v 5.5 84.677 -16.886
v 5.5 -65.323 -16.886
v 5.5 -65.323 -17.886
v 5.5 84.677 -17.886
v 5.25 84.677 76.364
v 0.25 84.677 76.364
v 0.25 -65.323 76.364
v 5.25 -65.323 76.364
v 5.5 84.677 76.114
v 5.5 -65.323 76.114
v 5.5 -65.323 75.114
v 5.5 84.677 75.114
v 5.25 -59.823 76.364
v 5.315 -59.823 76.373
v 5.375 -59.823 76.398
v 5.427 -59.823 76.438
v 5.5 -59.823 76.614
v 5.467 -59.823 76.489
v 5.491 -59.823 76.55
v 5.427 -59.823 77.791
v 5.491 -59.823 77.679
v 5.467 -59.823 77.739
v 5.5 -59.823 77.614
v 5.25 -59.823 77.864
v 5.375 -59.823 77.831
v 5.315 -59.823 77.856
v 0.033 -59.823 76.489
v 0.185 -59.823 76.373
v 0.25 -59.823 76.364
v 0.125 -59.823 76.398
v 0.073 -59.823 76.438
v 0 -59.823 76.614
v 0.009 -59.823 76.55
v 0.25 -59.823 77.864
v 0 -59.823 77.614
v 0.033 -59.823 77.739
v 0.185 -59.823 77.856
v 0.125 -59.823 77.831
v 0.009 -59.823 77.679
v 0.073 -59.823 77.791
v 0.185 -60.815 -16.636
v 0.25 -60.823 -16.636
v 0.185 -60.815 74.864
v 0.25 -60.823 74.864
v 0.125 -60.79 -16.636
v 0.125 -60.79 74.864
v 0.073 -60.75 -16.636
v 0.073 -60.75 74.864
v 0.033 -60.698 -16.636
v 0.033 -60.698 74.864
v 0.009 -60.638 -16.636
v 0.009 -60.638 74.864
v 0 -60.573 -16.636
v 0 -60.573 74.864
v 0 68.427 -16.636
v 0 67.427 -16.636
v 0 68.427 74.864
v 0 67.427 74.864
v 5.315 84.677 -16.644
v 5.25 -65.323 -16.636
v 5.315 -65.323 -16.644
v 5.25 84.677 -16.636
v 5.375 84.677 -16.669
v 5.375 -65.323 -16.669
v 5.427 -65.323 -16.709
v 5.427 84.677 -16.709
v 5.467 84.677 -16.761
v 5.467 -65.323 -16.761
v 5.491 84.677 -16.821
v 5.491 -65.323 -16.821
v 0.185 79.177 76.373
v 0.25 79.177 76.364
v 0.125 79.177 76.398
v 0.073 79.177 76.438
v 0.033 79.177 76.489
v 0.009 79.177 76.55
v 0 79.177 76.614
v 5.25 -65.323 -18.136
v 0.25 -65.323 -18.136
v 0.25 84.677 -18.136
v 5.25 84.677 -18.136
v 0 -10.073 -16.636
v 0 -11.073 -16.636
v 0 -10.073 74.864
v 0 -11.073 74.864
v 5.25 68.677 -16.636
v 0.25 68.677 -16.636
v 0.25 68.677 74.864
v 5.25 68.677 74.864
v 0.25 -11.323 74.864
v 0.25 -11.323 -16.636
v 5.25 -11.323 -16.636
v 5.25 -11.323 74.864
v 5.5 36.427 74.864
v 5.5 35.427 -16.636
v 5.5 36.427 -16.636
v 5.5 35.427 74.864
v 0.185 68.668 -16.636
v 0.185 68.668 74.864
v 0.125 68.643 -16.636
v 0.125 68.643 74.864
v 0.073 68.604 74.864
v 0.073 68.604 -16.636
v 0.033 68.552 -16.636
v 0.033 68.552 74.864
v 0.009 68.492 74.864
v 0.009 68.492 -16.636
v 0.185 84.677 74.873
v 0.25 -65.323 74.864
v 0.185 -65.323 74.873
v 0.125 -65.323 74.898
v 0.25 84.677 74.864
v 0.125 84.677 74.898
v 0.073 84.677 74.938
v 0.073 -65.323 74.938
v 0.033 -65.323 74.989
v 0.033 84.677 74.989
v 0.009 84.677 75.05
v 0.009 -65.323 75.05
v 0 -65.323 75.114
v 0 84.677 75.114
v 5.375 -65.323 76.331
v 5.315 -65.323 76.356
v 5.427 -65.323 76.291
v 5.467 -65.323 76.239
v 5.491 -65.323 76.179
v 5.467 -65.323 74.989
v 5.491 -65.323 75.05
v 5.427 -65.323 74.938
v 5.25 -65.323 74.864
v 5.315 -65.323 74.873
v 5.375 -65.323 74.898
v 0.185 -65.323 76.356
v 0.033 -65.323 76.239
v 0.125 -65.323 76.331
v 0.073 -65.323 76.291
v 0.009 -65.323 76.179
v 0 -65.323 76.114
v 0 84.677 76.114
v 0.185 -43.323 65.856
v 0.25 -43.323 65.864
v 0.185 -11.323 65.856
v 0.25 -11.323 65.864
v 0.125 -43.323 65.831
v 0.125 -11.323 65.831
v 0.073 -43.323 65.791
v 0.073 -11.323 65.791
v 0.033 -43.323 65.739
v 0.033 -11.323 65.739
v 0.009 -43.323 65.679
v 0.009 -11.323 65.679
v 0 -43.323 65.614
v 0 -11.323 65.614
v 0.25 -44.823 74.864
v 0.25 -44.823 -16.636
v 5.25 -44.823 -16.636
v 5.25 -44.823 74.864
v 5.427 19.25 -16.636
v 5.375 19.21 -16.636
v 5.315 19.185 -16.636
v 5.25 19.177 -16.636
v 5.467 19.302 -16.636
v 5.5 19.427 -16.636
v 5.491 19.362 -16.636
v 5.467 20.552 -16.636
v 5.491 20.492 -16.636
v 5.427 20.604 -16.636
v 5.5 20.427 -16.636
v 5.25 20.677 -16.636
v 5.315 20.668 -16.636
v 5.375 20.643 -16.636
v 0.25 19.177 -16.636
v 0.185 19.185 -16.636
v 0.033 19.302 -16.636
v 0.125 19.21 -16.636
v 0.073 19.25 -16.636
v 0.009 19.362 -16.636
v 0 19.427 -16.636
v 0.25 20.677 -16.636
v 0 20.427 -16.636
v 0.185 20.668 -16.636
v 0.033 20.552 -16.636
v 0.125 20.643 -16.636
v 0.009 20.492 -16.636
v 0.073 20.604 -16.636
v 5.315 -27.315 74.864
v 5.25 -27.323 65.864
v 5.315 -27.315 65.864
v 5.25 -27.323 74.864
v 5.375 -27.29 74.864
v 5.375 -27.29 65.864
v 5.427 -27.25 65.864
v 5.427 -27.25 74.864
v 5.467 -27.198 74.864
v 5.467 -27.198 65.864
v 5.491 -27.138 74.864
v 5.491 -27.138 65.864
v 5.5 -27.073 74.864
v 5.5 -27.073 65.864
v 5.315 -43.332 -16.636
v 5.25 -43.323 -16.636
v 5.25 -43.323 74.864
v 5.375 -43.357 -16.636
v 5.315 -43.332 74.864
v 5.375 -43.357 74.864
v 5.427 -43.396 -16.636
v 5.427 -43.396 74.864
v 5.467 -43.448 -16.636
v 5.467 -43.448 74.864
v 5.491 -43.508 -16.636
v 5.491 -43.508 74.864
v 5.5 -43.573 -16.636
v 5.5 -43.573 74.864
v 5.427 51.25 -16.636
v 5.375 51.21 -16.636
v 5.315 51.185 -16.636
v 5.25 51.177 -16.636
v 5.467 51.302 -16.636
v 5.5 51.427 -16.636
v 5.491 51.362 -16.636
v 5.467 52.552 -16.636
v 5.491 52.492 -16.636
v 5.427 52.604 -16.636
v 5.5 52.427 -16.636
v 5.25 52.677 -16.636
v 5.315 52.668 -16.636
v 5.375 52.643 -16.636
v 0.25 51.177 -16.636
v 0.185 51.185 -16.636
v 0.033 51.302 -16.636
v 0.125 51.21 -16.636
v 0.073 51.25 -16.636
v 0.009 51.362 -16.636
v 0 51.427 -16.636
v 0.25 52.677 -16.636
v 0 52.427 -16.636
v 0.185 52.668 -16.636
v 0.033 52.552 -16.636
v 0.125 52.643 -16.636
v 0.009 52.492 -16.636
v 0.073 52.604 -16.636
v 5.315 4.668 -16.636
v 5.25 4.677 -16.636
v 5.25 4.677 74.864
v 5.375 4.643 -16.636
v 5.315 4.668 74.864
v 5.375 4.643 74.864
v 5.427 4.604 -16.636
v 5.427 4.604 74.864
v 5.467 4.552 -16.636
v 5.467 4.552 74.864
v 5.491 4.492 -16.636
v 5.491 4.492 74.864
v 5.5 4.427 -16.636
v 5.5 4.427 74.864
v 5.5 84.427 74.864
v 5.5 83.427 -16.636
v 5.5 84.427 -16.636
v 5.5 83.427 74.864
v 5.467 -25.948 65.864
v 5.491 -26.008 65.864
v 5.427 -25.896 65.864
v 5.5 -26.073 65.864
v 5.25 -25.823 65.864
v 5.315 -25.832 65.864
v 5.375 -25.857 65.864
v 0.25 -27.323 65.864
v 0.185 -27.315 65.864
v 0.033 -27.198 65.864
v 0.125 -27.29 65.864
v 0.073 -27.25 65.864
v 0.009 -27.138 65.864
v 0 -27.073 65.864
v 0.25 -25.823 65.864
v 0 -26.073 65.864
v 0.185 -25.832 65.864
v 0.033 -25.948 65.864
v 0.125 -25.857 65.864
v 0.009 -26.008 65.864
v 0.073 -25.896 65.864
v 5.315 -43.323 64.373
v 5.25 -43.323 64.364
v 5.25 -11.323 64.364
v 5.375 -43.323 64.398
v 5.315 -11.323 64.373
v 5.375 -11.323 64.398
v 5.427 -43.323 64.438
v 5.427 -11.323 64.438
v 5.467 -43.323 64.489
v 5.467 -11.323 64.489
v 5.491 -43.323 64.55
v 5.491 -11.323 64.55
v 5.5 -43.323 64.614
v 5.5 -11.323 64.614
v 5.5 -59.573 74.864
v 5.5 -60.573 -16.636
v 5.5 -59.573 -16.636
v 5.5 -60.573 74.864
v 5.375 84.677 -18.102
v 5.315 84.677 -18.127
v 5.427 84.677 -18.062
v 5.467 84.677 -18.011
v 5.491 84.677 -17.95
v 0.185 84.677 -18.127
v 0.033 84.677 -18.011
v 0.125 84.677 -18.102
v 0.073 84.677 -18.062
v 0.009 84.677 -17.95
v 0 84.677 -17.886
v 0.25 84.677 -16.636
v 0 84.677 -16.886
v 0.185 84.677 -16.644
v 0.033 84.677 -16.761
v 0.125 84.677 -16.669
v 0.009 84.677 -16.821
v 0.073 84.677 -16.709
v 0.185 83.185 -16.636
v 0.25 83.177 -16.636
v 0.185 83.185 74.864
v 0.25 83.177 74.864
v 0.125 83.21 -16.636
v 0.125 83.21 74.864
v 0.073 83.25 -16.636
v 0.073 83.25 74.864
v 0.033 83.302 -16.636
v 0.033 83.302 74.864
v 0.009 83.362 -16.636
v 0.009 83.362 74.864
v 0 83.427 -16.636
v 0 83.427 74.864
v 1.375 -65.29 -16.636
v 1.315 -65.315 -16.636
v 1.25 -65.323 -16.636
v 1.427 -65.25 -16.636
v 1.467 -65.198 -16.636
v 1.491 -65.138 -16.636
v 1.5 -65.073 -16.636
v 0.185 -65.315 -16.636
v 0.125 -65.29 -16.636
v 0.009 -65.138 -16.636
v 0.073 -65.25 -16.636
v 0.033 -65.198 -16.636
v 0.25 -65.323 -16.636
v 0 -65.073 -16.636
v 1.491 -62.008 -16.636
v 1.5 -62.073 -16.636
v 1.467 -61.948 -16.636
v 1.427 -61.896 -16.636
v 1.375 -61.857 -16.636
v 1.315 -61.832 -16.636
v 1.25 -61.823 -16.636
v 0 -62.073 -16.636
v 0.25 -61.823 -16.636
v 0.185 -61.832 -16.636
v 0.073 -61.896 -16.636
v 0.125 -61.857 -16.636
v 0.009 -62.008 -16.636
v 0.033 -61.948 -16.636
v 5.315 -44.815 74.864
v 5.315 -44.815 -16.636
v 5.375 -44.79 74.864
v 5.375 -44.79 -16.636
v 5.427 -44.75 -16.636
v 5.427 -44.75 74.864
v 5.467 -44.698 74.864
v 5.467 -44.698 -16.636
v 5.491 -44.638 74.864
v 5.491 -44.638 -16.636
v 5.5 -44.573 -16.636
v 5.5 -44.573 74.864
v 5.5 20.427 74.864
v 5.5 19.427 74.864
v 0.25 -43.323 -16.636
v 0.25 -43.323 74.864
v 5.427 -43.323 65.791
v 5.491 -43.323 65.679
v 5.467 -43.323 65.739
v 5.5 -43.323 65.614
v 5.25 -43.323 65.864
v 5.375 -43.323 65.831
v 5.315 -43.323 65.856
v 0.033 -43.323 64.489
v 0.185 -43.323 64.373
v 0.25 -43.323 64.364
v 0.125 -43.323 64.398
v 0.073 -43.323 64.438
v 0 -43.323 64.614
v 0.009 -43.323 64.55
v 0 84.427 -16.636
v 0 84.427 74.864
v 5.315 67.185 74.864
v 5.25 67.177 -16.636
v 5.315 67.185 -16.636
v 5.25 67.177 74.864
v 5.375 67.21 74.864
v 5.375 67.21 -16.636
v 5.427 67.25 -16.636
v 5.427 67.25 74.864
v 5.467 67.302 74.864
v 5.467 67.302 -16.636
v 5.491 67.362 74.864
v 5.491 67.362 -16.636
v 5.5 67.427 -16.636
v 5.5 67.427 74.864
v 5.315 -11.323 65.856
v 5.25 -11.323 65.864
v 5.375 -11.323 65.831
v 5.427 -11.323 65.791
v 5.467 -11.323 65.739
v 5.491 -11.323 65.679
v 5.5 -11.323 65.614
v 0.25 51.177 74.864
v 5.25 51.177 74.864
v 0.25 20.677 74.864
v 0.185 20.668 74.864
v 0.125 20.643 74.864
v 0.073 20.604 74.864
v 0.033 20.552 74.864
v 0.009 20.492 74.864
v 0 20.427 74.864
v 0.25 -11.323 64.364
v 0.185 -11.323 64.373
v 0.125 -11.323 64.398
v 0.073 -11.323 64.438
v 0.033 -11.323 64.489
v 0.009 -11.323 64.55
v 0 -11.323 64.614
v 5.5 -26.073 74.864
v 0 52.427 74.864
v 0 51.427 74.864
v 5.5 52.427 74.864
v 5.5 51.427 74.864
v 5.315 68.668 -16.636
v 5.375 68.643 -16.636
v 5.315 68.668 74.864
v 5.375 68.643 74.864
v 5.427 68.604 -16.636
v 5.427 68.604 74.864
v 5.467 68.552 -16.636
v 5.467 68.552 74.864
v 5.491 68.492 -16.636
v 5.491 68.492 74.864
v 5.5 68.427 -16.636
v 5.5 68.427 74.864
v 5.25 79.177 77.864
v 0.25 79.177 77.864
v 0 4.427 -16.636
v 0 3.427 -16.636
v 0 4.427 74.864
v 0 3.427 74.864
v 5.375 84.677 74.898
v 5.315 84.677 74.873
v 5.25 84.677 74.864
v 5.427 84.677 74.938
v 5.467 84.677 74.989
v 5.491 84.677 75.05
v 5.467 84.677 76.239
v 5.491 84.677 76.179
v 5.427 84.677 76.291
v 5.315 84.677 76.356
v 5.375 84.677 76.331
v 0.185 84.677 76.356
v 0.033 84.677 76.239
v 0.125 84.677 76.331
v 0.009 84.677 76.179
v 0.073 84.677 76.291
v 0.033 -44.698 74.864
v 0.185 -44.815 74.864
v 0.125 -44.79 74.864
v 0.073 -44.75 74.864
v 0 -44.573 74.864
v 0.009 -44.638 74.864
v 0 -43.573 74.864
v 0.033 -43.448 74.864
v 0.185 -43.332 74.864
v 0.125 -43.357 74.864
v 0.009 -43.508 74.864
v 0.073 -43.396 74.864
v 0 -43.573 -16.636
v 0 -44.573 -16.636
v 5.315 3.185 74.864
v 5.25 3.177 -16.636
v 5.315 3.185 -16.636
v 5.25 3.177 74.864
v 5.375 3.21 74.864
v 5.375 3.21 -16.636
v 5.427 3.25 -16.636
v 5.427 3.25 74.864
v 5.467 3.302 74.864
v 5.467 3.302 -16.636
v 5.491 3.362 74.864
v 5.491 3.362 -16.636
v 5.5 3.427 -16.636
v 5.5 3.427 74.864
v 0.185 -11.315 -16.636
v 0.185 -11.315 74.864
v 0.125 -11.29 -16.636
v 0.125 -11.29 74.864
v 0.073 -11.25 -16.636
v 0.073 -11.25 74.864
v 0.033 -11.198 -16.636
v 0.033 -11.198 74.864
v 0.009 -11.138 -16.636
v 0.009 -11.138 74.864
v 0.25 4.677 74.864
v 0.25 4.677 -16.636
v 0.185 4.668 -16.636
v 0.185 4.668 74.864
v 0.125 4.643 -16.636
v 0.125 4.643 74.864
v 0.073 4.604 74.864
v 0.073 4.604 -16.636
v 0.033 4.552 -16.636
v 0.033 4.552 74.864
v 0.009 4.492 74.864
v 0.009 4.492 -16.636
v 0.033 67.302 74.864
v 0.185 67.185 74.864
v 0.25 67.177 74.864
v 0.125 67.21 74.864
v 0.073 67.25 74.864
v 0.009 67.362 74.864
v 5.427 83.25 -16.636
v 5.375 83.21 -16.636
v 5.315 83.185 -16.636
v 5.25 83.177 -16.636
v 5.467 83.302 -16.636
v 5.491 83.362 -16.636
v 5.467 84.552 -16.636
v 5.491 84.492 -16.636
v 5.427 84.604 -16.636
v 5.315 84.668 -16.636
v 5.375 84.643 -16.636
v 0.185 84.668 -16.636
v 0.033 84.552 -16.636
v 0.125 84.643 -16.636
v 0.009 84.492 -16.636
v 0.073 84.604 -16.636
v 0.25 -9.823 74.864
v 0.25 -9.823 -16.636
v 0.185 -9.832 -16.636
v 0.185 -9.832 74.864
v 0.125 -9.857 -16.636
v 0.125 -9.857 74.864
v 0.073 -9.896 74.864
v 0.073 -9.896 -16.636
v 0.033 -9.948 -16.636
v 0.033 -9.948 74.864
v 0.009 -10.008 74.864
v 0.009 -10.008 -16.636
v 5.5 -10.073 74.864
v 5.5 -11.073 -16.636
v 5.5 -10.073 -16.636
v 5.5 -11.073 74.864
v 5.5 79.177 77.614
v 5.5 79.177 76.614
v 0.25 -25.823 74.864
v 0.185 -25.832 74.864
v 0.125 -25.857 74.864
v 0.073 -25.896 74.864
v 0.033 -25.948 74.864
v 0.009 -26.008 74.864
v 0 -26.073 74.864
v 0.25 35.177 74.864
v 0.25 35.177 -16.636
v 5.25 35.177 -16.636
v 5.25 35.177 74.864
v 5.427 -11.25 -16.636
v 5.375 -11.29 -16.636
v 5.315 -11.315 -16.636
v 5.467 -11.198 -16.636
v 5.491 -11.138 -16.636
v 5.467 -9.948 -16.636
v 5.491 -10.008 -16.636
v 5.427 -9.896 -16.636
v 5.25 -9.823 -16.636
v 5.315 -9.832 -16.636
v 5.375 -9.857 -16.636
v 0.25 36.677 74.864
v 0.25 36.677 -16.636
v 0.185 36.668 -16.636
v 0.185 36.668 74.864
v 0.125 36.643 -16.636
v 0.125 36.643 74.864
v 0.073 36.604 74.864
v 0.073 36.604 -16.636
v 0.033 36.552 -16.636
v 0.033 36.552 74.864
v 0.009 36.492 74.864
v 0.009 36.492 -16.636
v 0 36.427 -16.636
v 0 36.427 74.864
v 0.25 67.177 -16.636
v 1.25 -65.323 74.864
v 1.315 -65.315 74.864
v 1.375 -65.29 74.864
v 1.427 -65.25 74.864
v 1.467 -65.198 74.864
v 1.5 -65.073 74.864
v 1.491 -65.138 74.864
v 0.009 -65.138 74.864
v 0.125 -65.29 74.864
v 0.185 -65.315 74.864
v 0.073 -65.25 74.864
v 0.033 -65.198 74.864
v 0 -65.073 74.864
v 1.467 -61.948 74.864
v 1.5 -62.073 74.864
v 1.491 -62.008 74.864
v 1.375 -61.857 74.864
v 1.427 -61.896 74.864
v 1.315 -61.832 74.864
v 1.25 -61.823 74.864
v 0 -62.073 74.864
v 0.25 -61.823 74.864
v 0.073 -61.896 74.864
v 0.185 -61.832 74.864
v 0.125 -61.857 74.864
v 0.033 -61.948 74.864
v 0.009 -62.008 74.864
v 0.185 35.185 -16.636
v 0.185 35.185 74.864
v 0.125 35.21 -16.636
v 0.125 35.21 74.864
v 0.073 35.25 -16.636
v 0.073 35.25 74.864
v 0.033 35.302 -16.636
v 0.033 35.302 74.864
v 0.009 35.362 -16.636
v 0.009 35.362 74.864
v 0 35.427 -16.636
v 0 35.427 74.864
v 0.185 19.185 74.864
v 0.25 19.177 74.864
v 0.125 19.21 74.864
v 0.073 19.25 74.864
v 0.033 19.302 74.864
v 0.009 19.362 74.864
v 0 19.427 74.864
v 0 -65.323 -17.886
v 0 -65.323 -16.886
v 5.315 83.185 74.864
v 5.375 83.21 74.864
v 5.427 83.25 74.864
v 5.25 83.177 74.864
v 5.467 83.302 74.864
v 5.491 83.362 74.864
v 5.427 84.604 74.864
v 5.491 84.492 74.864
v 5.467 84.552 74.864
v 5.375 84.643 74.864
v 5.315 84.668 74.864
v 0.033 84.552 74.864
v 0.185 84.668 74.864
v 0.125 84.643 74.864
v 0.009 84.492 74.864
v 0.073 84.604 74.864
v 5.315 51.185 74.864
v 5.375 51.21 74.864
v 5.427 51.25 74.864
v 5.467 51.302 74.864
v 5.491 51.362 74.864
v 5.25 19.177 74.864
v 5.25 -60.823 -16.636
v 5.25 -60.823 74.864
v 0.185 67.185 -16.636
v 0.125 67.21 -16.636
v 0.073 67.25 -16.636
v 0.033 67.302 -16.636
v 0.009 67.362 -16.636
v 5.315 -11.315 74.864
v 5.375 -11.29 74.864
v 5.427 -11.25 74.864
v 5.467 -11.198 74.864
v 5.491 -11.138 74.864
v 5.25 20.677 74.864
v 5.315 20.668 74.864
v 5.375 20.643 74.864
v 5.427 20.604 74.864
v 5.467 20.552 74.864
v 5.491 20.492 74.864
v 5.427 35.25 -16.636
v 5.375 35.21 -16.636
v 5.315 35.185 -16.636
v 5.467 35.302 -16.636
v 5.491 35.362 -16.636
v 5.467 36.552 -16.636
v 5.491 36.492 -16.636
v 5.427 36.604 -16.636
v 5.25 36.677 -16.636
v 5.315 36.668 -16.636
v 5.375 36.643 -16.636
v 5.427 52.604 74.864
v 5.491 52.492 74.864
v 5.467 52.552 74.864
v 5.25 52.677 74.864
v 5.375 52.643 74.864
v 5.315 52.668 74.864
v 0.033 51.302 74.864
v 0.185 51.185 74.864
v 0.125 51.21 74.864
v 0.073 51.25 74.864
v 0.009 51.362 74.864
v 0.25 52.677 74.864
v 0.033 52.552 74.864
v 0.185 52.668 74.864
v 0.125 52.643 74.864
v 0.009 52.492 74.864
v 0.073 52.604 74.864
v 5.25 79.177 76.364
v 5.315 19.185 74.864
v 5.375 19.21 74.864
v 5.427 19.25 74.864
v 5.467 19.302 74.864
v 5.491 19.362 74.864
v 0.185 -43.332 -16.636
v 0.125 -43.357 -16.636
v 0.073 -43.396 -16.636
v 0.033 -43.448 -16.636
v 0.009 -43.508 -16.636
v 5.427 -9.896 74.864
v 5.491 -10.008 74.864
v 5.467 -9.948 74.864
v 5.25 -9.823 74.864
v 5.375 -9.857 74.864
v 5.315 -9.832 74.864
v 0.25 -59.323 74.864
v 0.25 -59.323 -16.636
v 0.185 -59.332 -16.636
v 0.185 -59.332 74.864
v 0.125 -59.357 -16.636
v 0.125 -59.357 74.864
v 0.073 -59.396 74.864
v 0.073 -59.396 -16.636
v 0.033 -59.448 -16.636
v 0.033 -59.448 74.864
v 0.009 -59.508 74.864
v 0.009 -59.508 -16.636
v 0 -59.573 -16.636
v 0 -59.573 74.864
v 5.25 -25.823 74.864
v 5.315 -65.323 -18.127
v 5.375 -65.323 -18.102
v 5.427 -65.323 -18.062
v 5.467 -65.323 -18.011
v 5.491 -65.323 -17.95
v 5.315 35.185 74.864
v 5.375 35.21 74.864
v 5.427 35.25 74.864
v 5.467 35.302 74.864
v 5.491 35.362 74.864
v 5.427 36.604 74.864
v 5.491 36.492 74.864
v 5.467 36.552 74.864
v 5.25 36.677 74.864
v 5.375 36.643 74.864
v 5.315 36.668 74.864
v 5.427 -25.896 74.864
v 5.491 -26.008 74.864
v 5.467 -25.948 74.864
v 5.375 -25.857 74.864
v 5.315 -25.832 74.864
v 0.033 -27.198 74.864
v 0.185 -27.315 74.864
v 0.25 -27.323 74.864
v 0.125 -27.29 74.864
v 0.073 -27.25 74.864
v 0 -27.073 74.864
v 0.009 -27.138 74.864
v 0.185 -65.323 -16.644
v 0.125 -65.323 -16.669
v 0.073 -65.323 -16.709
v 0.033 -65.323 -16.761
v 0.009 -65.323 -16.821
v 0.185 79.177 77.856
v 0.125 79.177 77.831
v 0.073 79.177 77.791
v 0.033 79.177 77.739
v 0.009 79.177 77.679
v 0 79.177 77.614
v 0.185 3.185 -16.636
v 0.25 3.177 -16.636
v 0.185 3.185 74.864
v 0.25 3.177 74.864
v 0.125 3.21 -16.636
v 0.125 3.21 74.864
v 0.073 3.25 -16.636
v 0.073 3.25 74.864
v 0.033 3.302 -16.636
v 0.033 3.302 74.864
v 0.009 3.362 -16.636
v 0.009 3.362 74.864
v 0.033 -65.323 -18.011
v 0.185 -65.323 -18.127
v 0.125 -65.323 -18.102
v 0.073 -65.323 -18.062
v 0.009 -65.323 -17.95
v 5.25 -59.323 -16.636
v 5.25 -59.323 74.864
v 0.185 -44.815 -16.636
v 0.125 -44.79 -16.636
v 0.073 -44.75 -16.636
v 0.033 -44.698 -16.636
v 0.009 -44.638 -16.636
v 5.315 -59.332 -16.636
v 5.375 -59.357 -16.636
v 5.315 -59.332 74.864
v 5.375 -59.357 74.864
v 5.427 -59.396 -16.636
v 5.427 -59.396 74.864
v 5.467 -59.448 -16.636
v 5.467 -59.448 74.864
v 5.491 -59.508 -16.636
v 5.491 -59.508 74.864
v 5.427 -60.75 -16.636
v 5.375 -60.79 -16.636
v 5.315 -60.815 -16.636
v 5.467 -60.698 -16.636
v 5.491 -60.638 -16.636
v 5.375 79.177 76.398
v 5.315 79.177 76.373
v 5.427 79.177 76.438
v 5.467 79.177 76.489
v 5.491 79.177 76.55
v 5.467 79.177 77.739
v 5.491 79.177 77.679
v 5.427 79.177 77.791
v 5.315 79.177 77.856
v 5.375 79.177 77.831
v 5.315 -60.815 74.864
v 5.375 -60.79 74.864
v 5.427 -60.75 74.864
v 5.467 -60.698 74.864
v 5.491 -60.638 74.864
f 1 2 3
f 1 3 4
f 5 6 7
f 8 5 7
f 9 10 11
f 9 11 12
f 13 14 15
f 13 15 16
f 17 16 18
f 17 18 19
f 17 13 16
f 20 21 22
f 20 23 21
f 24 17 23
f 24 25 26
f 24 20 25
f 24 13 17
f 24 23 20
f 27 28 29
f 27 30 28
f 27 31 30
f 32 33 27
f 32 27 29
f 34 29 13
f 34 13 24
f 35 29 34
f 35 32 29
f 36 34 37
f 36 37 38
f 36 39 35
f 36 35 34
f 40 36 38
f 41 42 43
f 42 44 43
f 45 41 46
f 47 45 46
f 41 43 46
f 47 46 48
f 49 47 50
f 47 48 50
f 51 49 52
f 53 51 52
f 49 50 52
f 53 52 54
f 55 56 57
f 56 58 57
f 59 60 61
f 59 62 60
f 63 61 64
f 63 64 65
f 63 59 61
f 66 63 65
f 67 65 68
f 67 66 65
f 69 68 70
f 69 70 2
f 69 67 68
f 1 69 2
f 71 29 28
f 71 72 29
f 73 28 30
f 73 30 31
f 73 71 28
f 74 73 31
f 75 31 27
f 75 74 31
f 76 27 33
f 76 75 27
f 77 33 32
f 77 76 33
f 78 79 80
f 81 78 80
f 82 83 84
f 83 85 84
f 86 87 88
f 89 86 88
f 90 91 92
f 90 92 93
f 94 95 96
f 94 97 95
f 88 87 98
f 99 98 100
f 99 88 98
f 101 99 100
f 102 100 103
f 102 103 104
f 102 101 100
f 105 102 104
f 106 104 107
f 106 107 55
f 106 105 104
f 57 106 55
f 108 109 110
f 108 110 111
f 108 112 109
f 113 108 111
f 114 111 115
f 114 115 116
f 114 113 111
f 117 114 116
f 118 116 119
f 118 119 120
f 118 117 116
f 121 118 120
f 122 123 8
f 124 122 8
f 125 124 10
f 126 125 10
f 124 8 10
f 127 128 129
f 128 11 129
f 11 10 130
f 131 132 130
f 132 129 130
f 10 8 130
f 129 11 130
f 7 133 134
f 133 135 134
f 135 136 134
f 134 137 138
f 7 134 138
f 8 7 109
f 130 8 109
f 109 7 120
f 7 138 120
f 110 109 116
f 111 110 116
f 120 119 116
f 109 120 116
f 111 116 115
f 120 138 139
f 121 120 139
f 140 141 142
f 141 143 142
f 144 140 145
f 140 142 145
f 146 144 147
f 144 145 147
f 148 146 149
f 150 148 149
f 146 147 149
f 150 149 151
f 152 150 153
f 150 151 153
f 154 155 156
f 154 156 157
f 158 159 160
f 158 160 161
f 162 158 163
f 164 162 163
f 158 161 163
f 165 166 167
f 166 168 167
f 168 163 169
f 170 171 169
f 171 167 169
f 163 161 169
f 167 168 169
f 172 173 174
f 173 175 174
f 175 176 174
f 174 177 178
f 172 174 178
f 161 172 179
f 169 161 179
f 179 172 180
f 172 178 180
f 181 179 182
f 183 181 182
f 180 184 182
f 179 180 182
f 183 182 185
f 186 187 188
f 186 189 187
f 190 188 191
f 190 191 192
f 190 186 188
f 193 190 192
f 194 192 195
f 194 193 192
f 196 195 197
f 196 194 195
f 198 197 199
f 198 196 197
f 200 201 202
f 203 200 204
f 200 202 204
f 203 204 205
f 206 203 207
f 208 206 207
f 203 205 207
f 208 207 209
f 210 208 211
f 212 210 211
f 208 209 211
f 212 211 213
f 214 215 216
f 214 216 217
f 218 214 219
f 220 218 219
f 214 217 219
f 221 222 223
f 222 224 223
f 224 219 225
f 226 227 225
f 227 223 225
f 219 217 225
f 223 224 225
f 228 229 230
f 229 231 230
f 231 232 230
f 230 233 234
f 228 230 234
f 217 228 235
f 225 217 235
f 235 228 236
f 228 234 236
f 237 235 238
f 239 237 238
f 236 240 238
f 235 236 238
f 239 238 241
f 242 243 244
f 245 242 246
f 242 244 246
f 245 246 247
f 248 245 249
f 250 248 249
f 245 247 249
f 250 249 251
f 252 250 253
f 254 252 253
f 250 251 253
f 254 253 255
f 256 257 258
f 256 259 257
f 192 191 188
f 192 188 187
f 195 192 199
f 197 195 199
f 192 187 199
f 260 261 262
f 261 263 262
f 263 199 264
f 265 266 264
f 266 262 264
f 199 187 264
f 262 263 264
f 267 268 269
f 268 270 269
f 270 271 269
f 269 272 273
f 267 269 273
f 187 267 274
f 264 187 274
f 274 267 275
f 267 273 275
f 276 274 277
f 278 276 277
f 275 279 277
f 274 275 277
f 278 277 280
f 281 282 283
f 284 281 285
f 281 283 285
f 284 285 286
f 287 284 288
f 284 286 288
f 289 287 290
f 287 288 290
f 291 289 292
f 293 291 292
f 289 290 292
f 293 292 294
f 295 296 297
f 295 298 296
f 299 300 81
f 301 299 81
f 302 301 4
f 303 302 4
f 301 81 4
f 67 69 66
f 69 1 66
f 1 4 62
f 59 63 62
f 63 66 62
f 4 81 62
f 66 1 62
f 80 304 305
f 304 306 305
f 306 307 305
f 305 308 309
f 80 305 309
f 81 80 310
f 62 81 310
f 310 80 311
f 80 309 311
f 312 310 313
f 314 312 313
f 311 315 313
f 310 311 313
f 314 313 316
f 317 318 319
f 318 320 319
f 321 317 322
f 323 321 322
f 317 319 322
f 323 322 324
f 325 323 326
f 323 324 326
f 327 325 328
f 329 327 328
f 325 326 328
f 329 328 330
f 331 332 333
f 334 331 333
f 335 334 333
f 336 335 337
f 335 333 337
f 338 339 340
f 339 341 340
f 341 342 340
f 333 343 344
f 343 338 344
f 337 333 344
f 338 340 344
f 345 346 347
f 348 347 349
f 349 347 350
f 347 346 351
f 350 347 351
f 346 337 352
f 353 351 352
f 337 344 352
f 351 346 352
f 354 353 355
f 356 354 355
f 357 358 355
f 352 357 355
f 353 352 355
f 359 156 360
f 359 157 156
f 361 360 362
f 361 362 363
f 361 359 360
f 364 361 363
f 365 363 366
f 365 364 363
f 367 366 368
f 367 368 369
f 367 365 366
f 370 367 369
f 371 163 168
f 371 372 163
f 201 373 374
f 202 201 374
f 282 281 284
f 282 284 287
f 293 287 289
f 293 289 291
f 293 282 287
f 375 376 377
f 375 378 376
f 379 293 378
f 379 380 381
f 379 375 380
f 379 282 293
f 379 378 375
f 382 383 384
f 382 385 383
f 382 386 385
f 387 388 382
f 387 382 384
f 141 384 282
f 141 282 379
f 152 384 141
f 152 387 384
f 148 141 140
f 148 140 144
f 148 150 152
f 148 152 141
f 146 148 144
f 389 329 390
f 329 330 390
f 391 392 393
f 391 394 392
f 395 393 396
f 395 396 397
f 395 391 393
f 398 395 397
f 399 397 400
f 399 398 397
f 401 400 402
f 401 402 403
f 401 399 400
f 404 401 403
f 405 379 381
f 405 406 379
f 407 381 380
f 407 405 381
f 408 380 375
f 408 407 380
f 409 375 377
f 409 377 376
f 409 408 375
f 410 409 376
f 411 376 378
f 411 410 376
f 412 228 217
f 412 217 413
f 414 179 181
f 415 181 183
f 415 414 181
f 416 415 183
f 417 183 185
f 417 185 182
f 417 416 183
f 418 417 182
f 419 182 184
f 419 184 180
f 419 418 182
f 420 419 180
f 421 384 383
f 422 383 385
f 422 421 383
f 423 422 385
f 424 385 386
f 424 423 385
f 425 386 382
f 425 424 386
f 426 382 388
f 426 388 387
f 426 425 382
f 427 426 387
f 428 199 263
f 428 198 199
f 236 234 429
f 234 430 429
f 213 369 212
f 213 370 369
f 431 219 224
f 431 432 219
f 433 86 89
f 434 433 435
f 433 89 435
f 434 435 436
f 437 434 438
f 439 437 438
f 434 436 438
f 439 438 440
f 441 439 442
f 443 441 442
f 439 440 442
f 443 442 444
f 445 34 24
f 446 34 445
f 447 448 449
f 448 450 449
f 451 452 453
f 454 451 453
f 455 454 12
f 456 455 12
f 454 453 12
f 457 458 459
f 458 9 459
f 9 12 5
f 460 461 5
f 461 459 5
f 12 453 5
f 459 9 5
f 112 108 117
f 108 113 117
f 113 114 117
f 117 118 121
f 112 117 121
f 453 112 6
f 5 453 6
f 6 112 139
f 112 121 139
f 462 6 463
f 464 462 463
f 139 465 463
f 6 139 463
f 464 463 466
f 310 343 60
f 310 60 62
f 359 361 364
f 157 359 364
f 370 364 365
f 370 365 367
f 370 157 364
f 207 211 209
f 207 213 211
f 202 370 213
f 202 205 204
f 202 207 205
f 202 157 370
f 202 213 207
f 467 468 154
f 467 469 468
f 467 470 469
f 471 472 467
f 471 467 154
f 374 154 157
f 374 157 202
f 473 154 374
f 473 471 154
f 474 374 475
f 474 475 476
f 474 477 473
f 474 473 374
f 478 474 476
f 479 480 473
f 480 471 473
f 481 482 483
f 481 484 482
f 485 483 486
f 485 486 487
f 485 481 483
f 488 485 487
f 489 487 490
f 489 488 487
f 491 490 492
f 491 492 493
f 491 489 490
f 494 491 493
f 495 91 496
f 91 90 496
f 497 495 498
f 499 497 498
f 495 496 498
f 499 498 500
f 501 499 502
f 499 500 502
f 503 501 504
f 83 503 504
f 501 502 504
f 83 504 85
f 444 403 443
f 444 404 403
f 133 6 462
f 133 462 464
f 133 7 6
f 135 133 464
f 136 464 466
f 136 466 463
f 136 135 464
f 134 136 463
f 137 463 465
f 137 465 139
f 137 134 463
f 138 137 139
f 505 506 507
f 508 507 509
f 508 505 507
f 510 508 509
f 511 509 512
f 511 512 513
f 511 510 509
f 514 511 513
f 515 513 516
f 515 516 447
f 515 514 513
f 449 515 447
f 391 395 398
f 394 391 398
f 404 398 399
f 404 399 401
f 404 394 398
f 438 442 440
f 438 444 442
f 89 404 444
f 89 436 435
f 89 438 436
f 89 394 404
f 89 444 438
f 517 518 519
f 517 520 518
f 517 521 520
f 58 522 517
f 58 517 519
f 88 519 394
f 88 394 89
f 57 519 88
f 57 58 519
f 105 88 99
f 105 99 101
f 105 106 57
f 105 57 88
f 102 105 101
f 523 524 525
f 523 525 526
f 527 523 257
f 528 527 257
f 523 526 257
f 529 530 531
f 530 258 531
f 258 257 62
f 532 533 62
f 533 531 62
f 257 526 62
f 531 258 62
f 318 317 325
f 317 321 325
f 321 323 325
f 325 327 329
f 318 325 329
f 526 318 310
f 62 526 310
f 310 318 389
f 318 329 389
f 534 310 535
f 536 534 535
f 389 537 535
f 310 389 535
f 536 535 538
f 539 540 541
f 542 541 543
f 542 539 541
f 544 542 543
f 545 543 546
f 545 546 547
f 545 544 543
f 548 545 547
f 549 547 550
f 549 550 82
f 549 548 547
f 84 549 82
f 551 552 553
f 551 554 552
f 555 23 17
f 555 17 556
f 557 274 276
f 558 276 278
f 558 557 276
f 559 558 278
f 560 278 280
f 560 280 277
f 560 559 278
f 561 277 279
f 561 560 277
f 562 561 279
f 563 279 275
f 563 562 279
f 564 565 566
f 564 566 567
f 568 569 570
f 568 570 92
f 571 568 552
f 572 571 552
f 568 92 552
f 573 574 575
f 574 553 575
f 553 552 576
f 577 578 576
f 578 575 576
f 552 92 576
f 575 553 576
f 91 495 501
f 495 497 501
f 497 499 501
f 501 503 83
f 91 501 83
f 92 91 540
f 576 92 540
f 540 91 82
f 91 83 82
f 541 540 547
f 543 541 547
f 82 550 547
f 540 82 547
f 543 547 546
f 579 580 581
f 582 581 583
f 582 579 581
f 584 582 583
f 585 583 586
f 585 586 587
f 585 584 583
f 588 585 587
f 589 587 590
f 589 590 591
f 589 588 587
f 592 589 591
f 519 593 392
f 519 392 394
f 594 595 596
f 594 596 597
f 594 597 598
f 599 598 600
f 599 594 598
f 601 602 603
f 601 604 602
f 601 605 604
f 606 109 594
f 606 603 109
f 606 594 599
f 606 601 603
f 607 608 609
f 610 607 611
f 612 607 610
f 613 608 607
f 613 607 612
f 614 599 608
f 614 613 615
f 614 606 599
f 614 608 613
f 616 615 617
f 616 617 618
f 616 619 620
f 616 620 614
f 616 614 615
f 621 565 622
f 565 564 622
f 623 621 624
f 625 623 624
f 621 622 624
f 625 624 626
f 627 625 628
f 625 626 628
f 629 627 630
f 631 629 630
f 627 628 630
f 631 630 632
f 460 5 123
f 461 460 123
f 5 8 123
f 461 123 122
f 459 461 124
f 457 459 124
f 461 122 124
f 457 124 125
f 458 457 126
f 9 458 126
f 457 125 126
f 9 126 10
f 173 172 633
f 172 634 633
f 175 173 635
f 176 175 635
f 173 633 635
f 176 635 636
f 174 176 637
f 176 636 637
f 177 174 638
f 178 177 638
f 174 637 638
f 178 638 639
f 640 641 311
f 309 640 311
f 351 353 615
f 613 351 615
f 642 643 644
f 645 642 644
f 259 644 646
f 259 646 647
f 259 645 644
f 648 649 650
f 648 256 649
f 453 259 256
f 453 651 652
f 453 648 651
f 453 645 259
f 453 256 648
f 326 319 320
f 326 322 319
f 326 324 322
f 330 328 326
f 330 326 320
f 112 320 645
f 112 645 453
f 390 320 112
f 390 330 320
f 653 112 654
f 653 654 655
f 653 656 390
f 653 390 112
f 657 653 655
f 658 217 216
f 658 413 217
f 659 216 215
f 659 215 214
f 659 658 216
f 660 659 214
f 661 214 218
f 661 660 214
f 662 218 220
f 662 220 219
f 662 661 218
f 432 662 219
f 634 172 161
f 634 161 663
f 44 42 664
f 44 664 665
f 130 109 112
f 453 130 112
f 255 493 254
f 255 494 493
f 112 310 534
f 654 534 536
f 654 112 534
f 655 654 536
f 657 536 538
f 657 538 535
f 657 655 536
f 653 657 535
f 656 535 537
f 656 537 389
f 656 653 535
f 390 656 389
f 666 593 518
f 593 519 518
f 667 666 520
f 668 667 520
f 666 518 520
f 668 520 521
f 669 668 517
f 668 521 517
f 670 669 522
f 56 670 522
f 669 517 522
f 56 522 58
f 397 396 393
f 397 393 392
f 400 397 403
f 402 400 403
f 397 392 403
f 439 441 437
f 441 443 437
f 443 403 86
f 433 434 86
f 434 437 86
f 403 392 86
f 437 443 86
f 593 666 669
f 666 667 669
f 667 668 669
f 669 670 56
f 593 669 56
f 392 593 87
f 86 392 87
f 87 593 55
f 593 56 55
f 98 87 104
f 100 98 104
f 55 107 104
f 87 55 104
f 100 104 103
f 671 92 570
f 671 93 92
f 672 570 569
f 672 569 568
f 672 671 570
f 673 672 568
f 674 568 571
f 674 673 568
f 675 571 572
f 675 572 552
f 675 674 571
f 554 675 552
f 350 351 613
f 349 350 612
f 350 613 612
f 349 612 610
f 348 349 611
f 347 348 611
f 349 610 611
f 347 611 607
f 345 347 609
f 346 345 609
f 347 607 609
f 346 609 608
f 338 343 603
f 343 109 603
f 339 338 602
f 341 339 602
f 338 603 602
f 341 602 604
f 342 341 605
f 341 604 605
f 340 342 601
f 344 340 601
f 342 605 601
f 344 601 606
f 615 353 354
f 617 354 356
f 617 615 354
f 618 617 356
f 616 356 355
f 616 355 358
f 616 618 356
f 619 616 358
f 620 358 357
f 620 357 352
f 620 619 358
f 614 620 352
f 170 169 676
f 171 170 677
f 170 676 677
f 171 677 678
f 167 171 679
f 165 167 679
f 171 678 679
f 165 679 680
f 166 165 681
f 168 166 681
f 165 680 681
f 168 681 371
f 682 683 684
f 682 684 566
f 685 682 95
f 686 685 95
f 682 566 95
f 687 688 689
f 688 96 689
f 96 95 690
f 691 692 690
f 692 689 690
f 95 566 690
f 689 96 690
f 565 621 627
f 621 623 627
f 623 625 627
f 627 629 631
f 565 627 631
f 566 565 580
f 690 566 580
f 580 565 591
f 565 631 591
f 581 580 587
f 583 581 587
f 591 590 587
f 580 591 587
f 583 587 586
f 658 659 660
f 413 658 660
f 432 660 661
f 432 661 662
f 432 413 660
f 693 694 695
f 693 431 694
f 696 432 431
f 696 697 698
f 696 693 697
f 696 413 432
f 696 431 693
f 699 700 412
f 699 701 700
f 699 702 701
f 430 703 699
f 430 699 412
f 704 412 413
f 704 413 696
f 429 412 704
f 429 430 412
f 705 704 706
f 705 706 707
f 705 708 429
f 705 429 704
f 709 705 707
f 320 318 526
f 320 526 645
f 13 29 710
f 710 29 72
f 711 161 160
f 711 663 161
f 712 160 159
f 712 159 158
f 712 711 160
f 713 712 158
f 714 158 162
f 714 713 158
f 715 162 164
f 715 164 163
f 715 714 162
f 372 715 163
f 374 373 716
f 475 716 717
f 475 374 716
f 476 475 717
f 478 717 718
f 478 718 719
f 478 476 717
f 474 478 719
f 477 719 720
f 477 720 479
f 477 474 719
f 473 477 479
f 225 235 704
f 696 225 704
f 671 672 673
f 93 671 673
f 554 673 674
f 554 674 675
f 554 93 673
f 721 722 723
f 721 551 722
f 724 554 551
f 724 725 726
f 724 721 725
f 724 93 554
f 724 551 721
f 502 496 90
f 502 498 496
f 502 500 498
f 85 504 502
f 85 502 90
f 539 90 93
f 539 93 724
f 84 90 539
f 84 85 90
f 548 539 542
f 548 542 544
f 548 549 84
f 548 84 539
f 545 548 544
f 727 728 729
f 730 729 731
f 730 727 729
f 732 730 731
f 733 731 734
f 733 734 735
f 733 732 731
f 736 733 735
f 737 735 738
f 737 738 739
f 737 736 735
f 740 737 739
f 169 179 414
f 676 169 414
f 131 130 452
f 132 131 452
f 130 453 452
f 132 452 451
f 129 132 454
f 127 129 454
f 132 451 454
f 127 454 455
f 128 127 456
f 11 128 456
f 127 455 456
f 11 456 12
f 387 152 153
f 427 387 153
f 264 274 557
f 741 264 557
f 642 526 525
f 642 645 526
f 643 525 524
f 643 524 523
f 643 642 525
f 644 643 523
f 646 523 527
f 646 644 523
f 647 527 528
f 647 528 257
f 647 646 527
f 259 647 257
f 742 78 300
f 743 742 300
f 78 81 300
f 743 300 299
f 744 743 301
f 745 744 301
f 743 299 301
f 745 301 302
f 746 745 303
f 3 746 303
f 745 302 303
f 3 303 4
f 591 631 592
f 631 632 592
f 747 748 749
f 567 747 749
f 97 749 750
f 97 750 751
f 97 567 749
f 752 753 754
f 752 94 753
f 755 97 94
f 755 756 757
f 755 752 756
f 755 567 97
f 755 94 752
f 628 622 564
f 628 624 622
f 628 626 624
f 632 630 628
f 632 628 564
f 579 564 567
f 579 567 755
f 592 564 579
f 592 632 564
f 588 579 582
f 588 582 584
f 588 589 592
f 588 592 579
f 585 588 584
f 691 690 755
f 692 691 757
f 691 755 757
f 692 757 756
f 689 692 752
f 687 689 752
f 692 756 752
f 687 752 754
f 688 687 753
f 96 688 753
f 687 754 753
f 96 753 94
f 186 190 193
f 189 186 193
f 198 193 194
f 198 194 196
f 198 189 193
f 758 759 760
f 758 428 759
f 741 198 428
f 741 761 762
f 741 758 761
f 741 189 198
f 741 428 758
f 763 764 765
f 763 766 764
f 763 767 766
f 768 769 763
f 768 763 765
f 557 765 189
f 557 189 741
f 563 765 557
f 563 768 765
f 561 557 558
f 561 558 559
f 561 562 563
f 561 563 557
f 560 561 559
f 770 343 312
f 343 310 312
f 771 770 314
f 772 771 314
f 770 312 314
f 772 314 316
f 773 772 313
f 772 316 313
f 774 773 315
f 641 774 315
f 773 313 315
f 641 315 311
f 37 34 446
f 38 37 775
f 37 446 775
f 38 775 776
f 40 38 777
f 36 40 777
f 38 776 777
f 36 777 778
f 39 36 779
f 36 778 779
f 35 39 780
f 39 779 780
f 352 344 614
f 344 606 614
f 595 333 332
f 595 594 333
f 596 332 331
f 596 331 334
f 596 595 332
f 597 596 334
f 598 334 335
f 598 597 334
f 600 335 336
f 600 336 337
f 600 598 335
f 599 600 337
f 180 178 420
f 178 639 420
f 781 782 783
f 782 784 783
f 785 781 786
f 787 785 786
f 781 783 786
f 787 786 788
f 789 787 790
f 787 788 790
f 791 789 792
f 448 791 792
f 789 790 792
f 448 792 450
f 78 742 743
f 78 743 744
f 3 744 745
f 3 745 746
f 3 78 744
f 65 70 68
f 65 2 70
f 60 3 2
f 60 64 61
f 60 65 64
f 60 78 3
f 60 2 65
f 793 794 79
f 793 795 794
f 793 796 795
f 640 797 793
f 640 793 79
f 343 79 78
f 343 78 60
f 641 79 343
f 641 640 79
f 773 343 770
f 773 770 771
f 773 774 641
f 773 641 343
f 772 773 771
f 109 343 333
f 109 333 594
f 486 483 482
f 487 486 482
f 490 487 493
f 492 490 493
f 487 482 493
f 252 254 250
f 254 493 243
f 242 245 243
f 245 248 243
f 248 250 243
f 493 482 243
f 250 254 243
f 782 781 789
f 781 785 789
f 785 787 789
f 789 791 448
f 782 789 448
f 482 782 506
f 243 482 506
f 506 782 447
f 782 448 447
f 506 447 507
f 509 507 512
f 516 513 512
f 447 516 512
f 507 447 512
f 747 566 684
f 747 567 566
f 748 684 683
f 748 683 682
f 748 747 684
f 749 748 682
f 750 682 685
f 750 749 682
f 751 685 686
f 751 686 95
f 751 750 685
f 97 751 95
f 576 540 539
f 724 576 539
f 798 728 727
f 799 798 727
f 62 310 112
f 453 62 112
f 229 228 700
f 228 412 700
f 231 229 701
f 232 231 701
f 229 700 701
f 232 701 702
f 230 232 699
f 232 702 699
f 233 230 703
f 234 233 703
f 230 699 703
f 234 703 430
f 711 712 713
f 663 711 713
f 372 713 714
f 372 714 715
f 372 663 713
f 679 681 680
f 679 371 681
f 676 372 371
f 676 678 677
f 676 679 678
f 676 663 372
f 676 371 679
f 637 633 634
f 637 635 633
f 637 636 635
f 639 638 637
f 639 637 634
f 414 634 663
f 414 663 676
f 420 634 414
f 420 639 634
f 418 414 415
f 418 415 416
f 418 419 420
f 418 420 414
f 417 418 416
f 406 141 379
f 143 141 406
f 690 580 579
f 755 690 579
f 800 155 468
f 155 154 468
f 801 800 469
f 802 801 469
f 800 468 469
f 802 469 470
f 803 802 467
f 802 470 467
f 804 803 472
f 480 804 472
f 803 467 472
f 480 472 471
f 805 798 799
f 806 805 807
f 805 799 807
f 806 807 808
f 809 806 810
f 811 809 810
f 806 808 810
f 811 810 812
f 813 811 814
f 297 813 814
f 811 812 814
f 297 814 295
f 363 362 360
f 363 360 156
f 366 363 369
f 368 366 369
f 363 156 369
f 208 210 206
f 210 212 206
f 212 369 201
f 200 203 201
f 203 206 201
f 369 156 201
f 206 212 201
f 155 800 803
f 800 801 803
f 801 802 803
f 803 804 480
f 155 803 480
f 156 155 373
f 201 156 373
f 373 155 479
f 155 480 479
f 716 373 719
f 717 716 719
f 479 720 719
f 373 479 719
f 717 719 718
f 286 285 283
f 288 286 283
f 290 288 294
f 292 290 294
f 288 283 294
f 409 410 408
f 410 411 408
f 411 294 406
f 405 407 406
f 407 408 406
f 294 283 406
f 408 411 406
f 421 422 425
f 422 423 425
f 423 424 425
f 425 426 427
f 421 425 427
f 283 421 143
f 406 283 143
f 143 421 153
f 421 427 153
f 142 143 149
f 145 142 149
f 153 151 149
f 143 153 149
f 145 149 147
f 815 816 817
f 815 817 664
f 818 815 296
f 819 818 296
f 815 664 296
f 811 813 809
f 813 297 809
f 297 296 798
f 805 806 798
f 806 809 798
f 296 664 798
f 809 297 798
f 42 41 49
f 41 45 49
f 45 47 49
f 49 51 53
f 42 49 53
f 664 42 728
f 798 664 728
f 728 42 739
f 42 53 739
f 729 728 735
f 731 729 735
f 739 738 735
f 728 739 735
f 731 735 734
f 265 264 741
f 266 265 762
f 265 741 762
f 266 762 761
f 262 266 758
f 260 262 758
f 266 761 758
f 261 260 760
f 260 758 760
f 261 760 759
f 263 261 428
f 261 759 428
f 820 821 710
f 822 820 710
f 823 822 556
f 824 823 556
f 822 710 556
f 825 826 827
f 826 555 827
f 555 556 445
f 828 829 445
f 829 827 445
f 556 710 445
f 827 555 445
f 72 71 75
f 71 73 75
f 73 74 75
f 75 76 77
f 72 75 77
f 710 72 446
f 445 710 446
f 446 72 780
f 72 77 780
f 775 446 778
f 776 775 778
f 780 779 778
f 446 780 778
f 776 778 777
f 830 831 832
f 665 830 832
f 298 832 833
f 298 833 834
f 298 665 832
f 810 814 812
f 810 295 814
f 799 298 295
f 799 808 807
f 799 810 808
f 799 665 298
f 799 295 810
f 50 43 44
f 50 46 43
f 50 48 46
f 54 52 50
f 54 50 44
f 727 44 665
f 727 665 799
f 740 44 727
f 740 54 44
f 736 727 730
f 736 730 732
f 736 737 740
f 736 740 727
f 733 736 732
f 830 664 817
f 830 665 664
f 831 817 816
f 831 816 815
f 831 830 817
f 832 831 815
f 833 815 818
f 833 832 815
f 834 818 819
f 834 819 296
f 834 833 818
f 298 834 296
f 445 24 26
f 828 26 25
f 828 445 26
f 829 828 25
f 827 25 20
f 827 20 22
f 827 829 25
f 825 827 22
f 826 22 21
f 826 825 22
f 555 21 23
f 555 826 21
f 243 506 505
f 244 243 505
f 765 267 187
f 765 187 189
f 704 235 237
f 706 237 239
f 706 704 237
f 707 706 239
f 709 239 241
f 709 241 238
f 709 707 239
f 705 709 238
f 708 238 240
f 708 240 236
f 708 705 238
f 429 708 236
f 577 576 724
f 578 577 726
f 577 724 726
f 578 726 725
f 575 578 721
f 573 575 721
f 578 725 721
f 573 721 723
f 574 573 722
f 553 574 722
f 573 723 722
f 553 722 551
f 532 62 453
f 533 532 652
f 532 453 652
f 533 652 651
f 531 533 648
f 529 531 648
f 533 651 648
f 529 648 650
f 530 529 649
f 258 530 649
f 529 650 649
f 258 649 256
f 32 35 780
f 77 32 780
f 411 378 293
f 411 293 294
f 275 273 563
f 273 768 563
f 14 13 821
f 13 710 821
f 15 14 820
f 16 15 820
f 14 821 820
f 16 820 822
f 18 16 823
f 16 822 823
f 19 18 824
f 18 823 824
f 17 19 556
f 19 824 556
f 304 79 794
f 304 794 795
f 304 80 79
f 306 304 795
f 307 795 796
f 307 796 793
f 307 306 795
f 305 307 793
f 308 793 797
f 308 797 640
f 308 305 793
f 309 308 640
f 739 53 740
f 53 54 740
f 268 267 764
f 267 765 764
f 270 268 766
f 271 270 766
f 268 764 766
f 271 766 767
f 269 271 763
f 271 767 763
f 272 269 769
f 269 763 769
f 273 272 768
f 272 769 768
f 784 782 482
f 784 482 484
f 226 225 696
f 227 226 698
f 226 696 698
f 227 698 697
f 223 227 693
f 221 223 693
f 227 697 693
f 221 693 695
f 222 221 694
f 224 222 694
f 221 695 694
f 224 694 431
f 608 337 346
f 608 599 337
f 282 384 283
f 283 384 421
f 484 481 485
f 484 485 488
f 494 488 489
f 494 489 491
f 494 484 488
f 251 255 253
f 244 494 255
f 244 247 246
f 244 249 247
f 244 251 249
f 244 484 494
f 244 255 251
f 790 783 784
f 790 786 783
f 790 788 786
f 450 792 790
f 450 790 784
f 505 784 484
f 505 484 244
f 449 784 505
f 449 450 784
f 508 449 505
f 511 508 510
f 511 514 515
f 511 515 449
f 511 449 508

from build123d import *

# Parameters (mm, degrees)
F0_W      = 150
F0_H      = 1.5
F1_DEPTH  = 5.5
F2_W      = 1.5
F2_H      = 91.5
F3_DEPTH  = 5.5
F4_W      = 32
F4_H      = 1.5
F5_DEPTH  = 5.5
F6_W      = 139
F6_H      = 1.5
F6_W_2    = 1.5
F6_H_2    = 9
F7_DEPTH  = 5.5
F8_R      = 0.25
F8_2_R    = 0.25
F8_3_R    = 0.25
F8_4_R    = 0.25
F8_5_R    = 0.25
F8_6_R    = 0.25
F8_7_R    = 0.25
F8_8_R    = 0.25
F8_9_R    = 0.25
F8_10_R   = 0.25
F8_11_R   = 0.25
F8_12_R   = 0.25
F9_W      = 3.5
F9_H      = 91.5
F10_DEPTH = 1.5
F11_R     = 0.25


# Not quite as in the source:
# - a feature names something its author has since deleted; it is built from what else it names


with BuildPart() as f1:
    # F0 (on Right) → F1 (new body)
    with BuildSketch(Plane.YZ):
        with Locations((9.6768632531, -17.3856742978)):
            Rectangle(F0_W, F0_H)
    extrude(amount=F1_DEPTH)

    # F8#12
    f8_12_edges = [f1.edges().sort_by_distance(p)[0] for p in [
        (0, 9.676863, -18.135674),
        (0, 9.676863, -16.635674),
        (5.5, 9.676863, -16.635674),
        (5.5, 9.676863, -18.135674),
    ]]
    fillet(f8_12_edges, radius=F8_12_R)


with BuildPart() as f3:
    # F2 (on Right) → F3 (new body)
    with BuildSketch(Plane.YZ):
        with Locations((83.9268632531, 29.1143257022)):
            Rectangle(F2_W, F2_H)
    extrude(amount=F3_DEPTH)

    # F8#6
    f8_6_edges = [f3.edges().sort_by_distance(p)[0] for p in [
        (5.5, 84.676863, 29.114326),
        (0, 84.676863, 29.114326),
        (0, 83.176863, 29.114326),
        (5.5, 83.176863, 29.114326),
    ]]
    fillet(f8_6_edges, radius=F8_6_R)


with BuildPart() as f3b:
    # F2 (on Right) → F3, piece 2 (new body)
    with BuildSketch(Plane.YZ):
        with Locations((67.9268632531, 29.1143257022)):
            Rectangle(F2_W, F2_H)
    extrude(amount=F3_DEPTH)

    # F8#3
    f8_3_edges = [f3b.edges().sort_by_distance(p)[0] for p in [
        (0, 67.176863, 29.114326),
        (0, 68.676863, 29.114326),
        (5.5, 68.676863, 29.114326),
        (5.5, 67.176863, 29.114326),
    ]]
    fillet(f8_3_edges, radius=F8_3_R)


with BuildPart() as f3c:
    # F2 (on Right) → F3, piece 3 (new body)
    with BuildSketch(Plane.YZ):
        with Locations((51.9268632531, 29.1143257022)):
            Rectangle(F2_W, F2_H)
    extrude(amount=F3_DEPTH)

    # F8#5
    f8_5_edges = [f3c.edges().sort_by_distance(p)[0] for p in [
        (0, 51.176863, 29.114326),
        (5.5, 52.676863, 29.114326),
        (0, 52.676863, 29.114326),
        (5.5, 51.176863, 29.114326),
    ]]
    fillet(f8_5_edges, radius=F8_5_R)


with BuildPart() as f3d:
    # F2 (on Right) → F3, piece 4 (new body)
    with BuildSketch(Plane.YZ):
        with Locations((35.9268632531, 29.1143257022)):
            Rectangle(F2_W, F2_H)
    extrude(amount=F3_DEPTH)

    # F8#4
    f8_4_edges = [f3d.edges().sort_by_distance(p)[0] for p in [
        (0, 35.176863, 29.114326),
        (5.5, 36.676863, 29.114326),
        (0, 36.676863, 29.114326),
        (5.5, 35.176863, 29.114326),
    ]]
    fillet(f8_4_edges, radius=F8_4_R)


with BuildPart() as f3e:
    # F2 (on Right) → F3, piece 5 (new body)
    with BuildSketch(Plane.YZ):
        with Locations((19.9268632531, 29.1143257022)):
            Rectangle(F2_W, F2_H)
    extrude(amount=F3_DEPTH)

    # F8
    f8_edges = [f3e.edges().sort_by_distance(p)[0] for p in [
        (0, 20.676863, 29.114326),
        (5.5, 20.676863, 29.114326),
        (0, 19.176863, 29.114326),
        (5.5, 19.176863, 29.114326),
    ]]
    fillet(f8_edges, radius=F8_R)


with BuildPart() as f3f:
    # F2 (on Right) → F3, piece 6 (new body)
    with BuildSketch(Plane.YZ):
        with Locations((3.9268632531, 29.1143257022)):
            Rectangle(F2_W, F2_H)
    extrude(amount=F3_DEPTH)

    # F8#2
    f8_2_edges = [f3f.edges().sort_by_distance(p)[0] for p in [
        (0, 3.176863, 29.114326),
        (5.5, 4.676863, 29.114326),
        (5.5, 3.176863, 29.114326),
        (0, 4.676863, 29.114326),
    ]]
    fillet(f8_2_edges, radius=F8_2_R)


with BuildPart() as f3g:
    # F2 (on Right) → F3, piece 7 (new body)
    with BuildSketch(Plane.YZ):
        with Locations((-10.5731367469, 29.1143257022)):
            Rectangle(F2_W, F2_H)
    extrude(amount=F3_DEPTH)

    # F8#9
    f8_9_edges = [f3g.edges().sort_by_distance(p)[0] for p in [
        (5.5, -11.323137, 29.114326),
        (0, -9.823137, 29.114326),
        (5.5, -9.823137, 29.114326),
        (0, -11.323137, 29.114326),
    ]]
    fillet(f8_9_edges, radius=F8_9_R)


with BuildPart() as f3h:
    # F2 (on Right) → F3, piece 8 (new body)
    with BuildSketch(Plane.YZ):
        with Locations((-44.0731367469, 29.1143257022)):
            Rectangle(F2_W, F2_H)
    extrude(amount=F3_DEPTH)

    # F8#7
    f8_7_edges = [f3h.edges().sort_by_distance(p)[0] for p in [
        (5.5, -43.323137, 29.114326),
        (0, -44.823137, 29.114326),
        (0, -43.323137, 29.114326),
        (5.5, -44.823137, 29.114326),
    ]]
    fillet(f8_7_edges, radius=F8_7_R)


with BuildPart() as f3i:
    # F2 (on Right) → F3, piece 9 (new body)
    with BuildSketch(Plane.YZ):
        with Locations((-60.0731367469, 29.1143257022)):
            Rectangle(F2_W, F2_H)
    extrude(amount=F3_DEPTH)

    # F8#8
    f8_8_edges = [f3i.edges().sort_by_distance(p)[0] for p in [
        (0, -59.323137, 29.114326),
        (5.5, -60.823137, 29.114326),
        (0, -60.823137, 29.114326),
        (5.5, -59.323137, 29.114326),
    ]]
    fillet(f8_8_edges, radius=F8_8_R)


with BuildPart() as f5:
    # F4 (on Right) → F5 (new body)
    with BuildSketch(Plane.YZ):
        Polygon((-65.3231367469, 74.8643257022), (84.6768632531, 74.8643257022), (84.6768632531, 76.3643257022), (79.1768632531, 76.3643257022), (-59.8231367469, 76.3643257022), (-65.3231367469, 76.3643257022), align=None)
        with Locations((-27.3231367469, 65.1143257022)):
            Rectangle(F4_W, F4_H)
    extrude(amount=F5_DEPTH)

    # F8#10
    f8_10_edges = [f5.edges().sort_by_distance(p)[0] for p in [
        (5.5, -27.323137, 65.864326),
        (0, -27.323137, 64.364326),
        (5.5, -27.323137, 64.364326),
        (0, -27.323137, 65.864326),
        (5.5, 9.676863, 74.864326),
        (0, 9.676863, 76.364326),
        (5.5, 9.676863, 76.364326),
        (0, 9.676863, 74.864326),
    ]]
    fillet(f8_10_edges, radius=F8_10_R)


with BuildPart() as f7:
    # F6 (on Right) → F7 (new body)
    with BuildSketch(Plane.YZ):
        with Locations((9.6768632531, 77.1143257022)):
            Rectangle(F6_W, F6_H)
        with Locations((-26.5731367469, 70.3643257022)):
            Rectangle(F6_W_2, F6_H_2)
    extrude(amount=F7_DEPTH)

    # F8#11
    f8_11_edges = [f7.edges().sort_by_distance(p)[0] for p in [
        (0, 9.676863, 77.864326),
        (5.5, 9.676863, 77.864326),
        (0, 9.676863, 76.364326),
        (5.5, 9.676863, 76.364326),
        (5.5, -25.823137, 70.364326),
        (5.5, -27.323137, 70.364326),
        (0, -27.323137, 70.364326),
        (0, -25.823137, 70.364326),
    ]]
    fillet(f8_11_edges, radius=F8_11_R)


with BuildPart() as f10:
    # F9 (on Right) → F10 (new body)
    with BuildSketch(Plane.YZ):
        with Locations((-63.5731367469, 29.1143257022)):
            Rectangle(F9_W, F9_H)
    extrude(amount=F10_DEPTH)

    # F11
    f11_edges = [f10.edges().sort_by_distance(p)[0] for p in [
        (0, -61.823137, 29.114326),
        (0, -65.323137, 29.114326),
        (1.5, -61.823137, 29.114326),
        (1.5, -65.323137, 29.114326),
    ]]
    fillet(f11_edges, radius=F11_R)


solid = Compound([f1.part, f3.part, f3b.part, f3c.part, f3d.part, f3e.part, f3f.part, f3g.part, f3h.part, f3i.part, f5.part, f7.part, f10.part])
